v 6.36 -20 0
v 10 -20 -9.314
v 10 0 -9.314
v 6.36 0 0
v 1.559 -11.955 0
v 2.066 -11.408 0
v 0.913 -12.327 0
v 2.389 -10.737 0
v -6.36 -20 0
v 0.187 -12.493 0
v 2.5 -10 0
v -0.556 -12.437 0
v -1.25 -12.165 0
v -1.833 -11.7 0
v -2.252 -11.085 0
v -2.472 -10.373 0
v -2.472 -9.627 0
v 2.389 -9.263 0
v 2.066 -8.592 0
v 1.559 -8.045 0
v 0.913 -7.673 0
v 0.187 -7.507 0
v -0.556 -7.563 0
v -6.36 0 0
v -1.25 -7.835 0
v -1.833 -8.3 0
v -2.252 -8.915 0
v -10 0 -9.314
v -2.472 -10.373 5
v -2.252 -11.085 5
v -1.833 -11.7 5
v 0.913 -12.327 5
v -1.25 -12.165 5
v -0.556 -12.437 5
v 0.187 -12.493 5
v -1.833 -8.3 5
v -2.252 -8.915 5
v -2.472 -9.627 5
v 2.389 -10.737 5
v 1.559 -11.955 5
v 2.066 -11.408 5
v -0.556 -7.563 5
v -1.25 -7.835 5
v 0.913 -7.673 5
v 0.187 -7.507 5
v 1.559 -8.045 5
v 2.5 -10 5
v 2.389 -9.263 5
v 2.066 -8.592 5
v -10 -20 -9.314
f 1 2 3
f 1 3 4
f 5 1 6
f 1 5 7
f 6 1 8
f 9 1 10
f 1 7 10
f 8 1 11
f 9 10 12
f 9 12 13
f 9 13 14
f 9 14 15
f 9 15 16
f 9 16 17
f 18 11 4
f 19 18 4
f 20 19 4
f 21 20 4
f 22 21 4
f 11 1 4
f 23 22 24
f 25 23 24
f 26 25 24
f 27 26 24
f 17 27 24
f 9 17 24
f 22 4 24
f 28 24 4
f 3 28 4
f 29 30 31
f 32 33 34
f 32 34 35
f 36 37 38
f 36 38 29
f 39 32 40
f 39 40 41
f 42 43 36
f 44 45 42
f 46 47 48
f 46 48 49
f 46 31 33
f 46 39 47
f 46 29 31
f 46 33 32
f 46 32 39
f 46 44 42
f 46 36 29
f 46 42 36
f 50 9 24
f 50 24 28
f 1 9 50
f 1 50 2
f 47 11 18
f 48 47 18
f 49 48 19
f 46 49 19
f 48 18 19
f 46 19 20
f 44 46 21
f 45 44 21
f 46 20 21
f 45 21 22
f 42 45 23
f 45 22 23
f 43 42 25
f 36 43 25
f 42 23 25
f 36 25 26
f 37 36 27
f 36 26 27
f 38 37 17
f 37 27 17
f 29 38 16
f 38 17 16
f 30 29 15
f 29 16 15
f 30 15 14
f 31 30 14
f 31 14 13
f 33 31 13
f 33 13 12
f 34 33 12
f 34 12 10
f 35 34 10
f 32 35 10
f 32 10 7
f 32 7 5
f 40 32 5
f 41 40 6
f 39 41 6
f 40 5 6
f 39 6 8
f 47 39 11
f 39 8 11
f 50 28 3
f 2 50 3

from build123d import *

# Parameters (mm, degrees)
F1_DEPTH = 20
F2_R     = 2.5
F3_DEPTH = 5


with BuildPart() as f1:
    # F0 (on Front) → F1 (new body)
    with BuildSketch(Plane.XZ):
        Polygon((6.36, 0), (0, 0), (-6.36, 0), (-10, -9.313989), (0, -9.313989), (10, -9.313989), align=None)
    extrude(amount=F1_DEPTH)

    # F2 (on face) → F3 (join)
    with BuildSketch(Plane.XY):
        with Locations((0, -10)):
            Circle(F2_R)
    extrude(amount=F3_DEPTH)


solid = f1.part
